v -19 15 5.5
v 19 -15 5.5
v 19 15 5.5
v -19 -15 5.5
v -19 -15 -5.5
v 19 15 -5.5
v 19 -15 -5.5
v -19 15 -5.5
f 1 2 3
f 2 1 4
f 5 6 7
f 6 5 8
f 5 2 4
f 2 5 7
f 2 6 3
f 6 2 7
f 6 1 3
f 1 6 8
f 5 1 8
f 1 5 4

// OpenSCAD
// file: BOSL2/std.scad
// Minimal BOSL2 compatibility shim for bundled gallery models.
// It implements only the helpers used by the imported OpenSCAD projects.

CENTER = [0, 0, 0];
BOTTOM = [0, 0, -1];
TOP = [0, 0, 1];
LEFT = [-1, 0, 0];
RIGHT = [1, 0, 0];
FRONT = [0, -1, 0];
BACK = [0, 1, 0];

module up(z=0) {
    translate([0, 0, z]) children();
}

module down(z=0) {
    translate([0, 0, -z]) children();
}

module attach(anchor=CENTER) {
    children();
}

module cuboid(size=[1, 1, 1], anchor=CENTER) {
    center = anchor == CENTER;
    translate(center ? [0, 0, 0] : [0, 0, size[2] / 2])
        cube(size, center=true);
    children();
}

module xcyl(h=1, r=1, anchor=CENTER) {
    center = anchor == CENTER;
    translate(center ? [0, 0, 0] : [h / 2, 0, 0])
        rotate([0, 90, 0])
            cylinder(h=h, r=r, center=true);
}
// main file
include <BOSL2/std.scad>

cuboid([38, 30, 11], chamfer=0.5);
